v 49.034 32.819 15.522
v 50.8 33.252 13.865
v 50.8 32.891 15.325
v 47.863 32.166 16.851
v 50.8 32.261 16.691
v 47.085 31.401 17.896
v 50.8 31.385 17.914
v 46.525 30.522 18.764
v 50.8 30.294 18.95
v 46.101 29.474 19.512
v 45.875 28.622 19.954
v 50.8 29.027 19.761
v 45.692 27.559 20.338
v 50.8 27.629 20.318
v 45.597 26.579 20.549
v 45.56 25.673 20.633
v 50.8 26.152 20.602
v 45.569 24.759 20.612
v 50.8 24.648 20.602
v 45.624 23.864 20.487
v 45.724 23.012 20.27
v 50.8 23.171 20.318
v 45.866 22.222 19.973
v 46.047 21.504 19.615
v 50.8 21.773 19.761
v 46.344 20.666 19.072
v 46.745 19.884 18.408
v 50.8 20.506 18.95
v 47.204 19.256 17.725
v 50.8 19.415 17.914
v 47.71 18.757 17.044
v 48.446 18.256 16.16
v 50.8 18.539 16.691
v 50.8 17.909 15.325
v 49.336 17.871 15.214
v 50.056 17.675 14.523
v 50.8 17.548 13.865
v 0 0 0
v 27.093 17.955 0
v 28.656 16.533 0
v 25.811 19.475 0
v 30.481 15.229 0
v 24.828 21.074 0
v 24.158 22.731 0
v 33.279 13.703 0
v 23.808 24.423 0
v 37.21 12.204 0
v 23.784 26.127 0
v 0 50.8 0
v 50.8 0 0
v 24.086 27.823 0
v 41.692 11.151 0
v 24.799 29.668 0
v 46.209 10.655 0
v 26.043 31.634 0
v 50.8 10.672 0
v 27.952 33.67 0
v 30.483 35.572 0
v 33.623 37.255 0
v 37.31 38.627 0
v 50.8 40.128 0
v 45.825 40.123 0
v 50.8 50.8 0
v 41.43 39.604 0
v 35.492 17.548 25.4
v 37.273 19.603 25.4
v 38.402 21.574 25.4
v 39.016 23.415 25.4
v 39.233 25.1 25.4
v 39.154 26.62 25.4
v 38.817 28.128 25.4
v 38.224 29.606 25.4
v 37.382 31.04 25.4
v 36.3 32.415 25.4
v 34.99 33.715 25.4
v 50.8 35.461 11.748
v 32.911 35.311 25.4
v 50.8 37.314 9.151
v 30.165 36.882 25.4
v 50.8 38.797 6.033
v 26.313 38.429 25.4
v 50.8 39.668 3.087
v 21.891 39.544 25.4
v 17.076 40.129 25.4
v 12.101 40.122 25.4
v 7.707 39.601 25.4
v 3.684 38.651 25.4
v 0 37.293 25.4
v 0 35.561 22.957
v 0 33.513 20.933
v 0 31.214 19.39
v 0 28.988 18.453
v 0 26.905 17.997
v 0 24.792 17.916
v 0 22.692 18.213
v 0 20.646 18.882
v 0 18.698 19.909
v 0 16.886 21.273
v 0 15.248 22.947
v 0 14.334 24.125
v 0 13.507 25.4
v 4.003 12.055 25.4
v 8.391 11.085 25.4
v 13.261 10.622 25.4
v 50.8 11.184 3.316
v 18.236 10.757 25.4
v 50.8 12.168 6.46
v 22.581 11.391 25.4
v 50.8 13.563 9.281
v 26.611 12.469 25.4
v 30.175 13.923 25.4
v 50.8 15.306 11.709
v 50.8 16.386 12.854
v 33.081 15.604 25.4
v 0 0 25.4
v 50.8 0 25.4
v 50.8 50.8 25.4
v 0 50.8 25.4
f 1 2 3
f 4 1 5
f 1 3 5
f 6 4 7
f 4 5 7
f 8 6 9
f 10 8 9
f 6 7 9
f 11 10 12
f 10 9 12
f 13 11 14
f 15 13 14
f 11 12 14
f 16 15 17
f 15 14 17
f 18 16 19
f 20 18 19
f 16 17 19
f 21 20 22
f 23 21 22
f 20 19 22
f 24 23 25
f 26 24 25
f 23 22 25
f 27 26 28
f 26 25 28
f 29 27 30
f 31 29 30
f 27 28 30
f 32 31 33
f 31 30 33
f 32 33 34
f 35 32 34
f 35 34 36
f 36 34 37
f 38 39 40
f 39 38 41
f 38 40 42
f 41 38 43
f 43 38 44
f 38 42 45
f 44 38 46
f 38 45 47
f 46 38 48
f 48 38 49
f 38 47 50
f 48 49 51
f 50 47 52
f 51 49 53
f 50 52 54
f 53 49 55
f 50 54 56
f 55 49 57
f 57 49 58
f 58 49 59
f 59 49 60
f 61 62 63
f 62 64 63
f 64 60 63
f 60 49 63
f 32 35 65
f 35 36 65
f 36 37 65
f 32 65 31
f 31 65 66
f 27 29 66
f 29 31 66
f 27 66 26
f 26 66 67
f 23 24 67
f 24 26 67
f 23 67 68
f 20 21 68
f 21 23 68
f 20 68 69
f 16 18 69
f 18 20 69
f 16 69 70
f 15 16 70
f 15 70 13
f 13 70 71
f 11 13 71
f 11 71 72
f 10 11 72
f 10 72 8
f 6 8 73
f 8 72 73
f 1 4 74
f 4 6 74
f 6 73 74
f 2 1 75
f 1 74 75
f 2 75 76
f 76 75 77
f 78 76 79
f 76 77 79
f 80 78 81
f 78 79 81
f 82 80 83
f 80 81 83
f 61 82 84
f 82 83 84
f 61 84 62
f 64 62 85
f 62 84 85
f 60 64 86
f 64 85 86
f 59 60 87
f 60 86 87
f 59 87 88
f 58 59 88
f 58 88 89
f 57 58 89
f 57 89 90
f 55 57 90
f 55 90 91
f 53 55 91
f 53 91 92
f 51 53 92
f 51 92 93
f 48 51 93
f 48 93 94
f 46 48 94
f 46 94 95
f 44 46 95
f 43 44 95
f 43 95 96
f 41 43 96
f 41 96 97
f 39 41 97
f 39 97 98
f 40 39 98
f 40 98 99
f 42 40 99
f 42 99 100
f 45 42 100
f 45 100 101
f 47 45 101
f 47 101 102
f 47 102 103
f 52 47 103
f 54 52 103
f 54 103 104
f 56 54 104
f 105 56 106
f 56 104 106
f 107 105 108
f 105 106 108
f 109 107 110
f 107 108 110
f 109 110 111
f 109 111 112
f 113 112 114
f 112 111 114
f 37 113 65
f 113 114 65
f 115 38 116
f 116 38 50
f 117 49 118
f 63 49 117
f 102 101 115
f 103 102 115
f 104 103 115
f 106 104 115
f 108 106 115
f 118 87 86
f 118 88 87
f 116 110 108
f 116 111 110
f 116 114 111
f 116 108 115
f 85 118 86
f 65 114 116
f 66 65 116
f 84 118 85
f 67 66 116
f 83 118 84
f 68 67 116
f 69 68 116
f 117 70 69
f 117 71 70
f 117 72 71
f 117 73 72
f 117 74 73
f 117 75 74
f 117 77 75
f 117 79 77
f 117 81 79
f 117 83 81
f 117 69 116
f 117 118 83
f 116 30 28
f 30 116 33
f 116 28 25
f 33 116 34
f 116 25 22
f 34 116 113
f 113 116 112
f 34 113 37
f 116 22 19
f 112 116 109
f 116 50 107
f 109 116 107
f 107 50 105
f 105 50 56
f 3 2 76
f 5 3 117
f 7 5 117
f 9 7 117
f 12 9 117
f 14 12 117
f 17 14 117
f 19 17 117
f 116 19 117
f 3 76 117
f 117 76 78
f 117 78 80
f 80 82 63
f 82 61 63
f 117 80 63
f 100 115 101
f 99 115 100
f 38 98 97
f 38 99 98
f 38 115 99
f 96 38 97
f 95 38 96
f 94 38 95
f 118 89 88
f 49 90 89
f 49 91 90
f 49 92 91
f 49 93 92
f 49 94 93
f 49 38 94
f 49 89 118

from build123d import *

# Parameters (mm, degrees)
SKETCH1_W           = 50.8
SKETCH1_H           = 50.8
BOSS_EXTRUDE1_DEPTH = 25.4
SKETCH2_R           = 7.9375
CUT_EXTRUDE1_DEPTH  = 25.4
SKETCH4_R           = 14.80168028
CUT_EXTRUDE2_DEPTH  = 113.055003212


with BuildPart() as part:
    # Sketch1 → Boss-Extrude1 (new body)
    with BuildSketch(Plane.XY):
        with Locations((25.4, 25.4)):
            Rectangle(SKETCH1_W, SKETCH1_H)
    extrude(amount=BOSS_EXTRUDE1_DEPTH)

    # Sketch2 → Cut-Extrude1 (cut)
    with BuildSketch(Plane(origin=(50.8, 0, 0), x_dir=(0, 0, -1), z_dir=(1, 0, 0))):
        with Locations((-12.7, 25.4)):
            Circle(SKETCH2_R)
    extrude(amount=-CUT_EXTRUDE1_DEPTH, mode=Mode.SUBTRACT)

    # Sketch4 → Cut-Extrude2 (cut, through all)
    with BuildSketch(Plane(origin=(-43.536509722, 0, 32.807113228), x_dir=(0, 1, 0), z_dir=(-0.7986355100472856, 0, 0.6018150231520579))):
        with Locations(Location((25.4, -29.09758227, 0), (0, 0, 237.964118951))):
            Circle(SKETCH4_R)
    extrude(amount=-CUT_EXTRUDE2_DEPTH, mode=Mode.SUBTRACT)


solid = part.part
